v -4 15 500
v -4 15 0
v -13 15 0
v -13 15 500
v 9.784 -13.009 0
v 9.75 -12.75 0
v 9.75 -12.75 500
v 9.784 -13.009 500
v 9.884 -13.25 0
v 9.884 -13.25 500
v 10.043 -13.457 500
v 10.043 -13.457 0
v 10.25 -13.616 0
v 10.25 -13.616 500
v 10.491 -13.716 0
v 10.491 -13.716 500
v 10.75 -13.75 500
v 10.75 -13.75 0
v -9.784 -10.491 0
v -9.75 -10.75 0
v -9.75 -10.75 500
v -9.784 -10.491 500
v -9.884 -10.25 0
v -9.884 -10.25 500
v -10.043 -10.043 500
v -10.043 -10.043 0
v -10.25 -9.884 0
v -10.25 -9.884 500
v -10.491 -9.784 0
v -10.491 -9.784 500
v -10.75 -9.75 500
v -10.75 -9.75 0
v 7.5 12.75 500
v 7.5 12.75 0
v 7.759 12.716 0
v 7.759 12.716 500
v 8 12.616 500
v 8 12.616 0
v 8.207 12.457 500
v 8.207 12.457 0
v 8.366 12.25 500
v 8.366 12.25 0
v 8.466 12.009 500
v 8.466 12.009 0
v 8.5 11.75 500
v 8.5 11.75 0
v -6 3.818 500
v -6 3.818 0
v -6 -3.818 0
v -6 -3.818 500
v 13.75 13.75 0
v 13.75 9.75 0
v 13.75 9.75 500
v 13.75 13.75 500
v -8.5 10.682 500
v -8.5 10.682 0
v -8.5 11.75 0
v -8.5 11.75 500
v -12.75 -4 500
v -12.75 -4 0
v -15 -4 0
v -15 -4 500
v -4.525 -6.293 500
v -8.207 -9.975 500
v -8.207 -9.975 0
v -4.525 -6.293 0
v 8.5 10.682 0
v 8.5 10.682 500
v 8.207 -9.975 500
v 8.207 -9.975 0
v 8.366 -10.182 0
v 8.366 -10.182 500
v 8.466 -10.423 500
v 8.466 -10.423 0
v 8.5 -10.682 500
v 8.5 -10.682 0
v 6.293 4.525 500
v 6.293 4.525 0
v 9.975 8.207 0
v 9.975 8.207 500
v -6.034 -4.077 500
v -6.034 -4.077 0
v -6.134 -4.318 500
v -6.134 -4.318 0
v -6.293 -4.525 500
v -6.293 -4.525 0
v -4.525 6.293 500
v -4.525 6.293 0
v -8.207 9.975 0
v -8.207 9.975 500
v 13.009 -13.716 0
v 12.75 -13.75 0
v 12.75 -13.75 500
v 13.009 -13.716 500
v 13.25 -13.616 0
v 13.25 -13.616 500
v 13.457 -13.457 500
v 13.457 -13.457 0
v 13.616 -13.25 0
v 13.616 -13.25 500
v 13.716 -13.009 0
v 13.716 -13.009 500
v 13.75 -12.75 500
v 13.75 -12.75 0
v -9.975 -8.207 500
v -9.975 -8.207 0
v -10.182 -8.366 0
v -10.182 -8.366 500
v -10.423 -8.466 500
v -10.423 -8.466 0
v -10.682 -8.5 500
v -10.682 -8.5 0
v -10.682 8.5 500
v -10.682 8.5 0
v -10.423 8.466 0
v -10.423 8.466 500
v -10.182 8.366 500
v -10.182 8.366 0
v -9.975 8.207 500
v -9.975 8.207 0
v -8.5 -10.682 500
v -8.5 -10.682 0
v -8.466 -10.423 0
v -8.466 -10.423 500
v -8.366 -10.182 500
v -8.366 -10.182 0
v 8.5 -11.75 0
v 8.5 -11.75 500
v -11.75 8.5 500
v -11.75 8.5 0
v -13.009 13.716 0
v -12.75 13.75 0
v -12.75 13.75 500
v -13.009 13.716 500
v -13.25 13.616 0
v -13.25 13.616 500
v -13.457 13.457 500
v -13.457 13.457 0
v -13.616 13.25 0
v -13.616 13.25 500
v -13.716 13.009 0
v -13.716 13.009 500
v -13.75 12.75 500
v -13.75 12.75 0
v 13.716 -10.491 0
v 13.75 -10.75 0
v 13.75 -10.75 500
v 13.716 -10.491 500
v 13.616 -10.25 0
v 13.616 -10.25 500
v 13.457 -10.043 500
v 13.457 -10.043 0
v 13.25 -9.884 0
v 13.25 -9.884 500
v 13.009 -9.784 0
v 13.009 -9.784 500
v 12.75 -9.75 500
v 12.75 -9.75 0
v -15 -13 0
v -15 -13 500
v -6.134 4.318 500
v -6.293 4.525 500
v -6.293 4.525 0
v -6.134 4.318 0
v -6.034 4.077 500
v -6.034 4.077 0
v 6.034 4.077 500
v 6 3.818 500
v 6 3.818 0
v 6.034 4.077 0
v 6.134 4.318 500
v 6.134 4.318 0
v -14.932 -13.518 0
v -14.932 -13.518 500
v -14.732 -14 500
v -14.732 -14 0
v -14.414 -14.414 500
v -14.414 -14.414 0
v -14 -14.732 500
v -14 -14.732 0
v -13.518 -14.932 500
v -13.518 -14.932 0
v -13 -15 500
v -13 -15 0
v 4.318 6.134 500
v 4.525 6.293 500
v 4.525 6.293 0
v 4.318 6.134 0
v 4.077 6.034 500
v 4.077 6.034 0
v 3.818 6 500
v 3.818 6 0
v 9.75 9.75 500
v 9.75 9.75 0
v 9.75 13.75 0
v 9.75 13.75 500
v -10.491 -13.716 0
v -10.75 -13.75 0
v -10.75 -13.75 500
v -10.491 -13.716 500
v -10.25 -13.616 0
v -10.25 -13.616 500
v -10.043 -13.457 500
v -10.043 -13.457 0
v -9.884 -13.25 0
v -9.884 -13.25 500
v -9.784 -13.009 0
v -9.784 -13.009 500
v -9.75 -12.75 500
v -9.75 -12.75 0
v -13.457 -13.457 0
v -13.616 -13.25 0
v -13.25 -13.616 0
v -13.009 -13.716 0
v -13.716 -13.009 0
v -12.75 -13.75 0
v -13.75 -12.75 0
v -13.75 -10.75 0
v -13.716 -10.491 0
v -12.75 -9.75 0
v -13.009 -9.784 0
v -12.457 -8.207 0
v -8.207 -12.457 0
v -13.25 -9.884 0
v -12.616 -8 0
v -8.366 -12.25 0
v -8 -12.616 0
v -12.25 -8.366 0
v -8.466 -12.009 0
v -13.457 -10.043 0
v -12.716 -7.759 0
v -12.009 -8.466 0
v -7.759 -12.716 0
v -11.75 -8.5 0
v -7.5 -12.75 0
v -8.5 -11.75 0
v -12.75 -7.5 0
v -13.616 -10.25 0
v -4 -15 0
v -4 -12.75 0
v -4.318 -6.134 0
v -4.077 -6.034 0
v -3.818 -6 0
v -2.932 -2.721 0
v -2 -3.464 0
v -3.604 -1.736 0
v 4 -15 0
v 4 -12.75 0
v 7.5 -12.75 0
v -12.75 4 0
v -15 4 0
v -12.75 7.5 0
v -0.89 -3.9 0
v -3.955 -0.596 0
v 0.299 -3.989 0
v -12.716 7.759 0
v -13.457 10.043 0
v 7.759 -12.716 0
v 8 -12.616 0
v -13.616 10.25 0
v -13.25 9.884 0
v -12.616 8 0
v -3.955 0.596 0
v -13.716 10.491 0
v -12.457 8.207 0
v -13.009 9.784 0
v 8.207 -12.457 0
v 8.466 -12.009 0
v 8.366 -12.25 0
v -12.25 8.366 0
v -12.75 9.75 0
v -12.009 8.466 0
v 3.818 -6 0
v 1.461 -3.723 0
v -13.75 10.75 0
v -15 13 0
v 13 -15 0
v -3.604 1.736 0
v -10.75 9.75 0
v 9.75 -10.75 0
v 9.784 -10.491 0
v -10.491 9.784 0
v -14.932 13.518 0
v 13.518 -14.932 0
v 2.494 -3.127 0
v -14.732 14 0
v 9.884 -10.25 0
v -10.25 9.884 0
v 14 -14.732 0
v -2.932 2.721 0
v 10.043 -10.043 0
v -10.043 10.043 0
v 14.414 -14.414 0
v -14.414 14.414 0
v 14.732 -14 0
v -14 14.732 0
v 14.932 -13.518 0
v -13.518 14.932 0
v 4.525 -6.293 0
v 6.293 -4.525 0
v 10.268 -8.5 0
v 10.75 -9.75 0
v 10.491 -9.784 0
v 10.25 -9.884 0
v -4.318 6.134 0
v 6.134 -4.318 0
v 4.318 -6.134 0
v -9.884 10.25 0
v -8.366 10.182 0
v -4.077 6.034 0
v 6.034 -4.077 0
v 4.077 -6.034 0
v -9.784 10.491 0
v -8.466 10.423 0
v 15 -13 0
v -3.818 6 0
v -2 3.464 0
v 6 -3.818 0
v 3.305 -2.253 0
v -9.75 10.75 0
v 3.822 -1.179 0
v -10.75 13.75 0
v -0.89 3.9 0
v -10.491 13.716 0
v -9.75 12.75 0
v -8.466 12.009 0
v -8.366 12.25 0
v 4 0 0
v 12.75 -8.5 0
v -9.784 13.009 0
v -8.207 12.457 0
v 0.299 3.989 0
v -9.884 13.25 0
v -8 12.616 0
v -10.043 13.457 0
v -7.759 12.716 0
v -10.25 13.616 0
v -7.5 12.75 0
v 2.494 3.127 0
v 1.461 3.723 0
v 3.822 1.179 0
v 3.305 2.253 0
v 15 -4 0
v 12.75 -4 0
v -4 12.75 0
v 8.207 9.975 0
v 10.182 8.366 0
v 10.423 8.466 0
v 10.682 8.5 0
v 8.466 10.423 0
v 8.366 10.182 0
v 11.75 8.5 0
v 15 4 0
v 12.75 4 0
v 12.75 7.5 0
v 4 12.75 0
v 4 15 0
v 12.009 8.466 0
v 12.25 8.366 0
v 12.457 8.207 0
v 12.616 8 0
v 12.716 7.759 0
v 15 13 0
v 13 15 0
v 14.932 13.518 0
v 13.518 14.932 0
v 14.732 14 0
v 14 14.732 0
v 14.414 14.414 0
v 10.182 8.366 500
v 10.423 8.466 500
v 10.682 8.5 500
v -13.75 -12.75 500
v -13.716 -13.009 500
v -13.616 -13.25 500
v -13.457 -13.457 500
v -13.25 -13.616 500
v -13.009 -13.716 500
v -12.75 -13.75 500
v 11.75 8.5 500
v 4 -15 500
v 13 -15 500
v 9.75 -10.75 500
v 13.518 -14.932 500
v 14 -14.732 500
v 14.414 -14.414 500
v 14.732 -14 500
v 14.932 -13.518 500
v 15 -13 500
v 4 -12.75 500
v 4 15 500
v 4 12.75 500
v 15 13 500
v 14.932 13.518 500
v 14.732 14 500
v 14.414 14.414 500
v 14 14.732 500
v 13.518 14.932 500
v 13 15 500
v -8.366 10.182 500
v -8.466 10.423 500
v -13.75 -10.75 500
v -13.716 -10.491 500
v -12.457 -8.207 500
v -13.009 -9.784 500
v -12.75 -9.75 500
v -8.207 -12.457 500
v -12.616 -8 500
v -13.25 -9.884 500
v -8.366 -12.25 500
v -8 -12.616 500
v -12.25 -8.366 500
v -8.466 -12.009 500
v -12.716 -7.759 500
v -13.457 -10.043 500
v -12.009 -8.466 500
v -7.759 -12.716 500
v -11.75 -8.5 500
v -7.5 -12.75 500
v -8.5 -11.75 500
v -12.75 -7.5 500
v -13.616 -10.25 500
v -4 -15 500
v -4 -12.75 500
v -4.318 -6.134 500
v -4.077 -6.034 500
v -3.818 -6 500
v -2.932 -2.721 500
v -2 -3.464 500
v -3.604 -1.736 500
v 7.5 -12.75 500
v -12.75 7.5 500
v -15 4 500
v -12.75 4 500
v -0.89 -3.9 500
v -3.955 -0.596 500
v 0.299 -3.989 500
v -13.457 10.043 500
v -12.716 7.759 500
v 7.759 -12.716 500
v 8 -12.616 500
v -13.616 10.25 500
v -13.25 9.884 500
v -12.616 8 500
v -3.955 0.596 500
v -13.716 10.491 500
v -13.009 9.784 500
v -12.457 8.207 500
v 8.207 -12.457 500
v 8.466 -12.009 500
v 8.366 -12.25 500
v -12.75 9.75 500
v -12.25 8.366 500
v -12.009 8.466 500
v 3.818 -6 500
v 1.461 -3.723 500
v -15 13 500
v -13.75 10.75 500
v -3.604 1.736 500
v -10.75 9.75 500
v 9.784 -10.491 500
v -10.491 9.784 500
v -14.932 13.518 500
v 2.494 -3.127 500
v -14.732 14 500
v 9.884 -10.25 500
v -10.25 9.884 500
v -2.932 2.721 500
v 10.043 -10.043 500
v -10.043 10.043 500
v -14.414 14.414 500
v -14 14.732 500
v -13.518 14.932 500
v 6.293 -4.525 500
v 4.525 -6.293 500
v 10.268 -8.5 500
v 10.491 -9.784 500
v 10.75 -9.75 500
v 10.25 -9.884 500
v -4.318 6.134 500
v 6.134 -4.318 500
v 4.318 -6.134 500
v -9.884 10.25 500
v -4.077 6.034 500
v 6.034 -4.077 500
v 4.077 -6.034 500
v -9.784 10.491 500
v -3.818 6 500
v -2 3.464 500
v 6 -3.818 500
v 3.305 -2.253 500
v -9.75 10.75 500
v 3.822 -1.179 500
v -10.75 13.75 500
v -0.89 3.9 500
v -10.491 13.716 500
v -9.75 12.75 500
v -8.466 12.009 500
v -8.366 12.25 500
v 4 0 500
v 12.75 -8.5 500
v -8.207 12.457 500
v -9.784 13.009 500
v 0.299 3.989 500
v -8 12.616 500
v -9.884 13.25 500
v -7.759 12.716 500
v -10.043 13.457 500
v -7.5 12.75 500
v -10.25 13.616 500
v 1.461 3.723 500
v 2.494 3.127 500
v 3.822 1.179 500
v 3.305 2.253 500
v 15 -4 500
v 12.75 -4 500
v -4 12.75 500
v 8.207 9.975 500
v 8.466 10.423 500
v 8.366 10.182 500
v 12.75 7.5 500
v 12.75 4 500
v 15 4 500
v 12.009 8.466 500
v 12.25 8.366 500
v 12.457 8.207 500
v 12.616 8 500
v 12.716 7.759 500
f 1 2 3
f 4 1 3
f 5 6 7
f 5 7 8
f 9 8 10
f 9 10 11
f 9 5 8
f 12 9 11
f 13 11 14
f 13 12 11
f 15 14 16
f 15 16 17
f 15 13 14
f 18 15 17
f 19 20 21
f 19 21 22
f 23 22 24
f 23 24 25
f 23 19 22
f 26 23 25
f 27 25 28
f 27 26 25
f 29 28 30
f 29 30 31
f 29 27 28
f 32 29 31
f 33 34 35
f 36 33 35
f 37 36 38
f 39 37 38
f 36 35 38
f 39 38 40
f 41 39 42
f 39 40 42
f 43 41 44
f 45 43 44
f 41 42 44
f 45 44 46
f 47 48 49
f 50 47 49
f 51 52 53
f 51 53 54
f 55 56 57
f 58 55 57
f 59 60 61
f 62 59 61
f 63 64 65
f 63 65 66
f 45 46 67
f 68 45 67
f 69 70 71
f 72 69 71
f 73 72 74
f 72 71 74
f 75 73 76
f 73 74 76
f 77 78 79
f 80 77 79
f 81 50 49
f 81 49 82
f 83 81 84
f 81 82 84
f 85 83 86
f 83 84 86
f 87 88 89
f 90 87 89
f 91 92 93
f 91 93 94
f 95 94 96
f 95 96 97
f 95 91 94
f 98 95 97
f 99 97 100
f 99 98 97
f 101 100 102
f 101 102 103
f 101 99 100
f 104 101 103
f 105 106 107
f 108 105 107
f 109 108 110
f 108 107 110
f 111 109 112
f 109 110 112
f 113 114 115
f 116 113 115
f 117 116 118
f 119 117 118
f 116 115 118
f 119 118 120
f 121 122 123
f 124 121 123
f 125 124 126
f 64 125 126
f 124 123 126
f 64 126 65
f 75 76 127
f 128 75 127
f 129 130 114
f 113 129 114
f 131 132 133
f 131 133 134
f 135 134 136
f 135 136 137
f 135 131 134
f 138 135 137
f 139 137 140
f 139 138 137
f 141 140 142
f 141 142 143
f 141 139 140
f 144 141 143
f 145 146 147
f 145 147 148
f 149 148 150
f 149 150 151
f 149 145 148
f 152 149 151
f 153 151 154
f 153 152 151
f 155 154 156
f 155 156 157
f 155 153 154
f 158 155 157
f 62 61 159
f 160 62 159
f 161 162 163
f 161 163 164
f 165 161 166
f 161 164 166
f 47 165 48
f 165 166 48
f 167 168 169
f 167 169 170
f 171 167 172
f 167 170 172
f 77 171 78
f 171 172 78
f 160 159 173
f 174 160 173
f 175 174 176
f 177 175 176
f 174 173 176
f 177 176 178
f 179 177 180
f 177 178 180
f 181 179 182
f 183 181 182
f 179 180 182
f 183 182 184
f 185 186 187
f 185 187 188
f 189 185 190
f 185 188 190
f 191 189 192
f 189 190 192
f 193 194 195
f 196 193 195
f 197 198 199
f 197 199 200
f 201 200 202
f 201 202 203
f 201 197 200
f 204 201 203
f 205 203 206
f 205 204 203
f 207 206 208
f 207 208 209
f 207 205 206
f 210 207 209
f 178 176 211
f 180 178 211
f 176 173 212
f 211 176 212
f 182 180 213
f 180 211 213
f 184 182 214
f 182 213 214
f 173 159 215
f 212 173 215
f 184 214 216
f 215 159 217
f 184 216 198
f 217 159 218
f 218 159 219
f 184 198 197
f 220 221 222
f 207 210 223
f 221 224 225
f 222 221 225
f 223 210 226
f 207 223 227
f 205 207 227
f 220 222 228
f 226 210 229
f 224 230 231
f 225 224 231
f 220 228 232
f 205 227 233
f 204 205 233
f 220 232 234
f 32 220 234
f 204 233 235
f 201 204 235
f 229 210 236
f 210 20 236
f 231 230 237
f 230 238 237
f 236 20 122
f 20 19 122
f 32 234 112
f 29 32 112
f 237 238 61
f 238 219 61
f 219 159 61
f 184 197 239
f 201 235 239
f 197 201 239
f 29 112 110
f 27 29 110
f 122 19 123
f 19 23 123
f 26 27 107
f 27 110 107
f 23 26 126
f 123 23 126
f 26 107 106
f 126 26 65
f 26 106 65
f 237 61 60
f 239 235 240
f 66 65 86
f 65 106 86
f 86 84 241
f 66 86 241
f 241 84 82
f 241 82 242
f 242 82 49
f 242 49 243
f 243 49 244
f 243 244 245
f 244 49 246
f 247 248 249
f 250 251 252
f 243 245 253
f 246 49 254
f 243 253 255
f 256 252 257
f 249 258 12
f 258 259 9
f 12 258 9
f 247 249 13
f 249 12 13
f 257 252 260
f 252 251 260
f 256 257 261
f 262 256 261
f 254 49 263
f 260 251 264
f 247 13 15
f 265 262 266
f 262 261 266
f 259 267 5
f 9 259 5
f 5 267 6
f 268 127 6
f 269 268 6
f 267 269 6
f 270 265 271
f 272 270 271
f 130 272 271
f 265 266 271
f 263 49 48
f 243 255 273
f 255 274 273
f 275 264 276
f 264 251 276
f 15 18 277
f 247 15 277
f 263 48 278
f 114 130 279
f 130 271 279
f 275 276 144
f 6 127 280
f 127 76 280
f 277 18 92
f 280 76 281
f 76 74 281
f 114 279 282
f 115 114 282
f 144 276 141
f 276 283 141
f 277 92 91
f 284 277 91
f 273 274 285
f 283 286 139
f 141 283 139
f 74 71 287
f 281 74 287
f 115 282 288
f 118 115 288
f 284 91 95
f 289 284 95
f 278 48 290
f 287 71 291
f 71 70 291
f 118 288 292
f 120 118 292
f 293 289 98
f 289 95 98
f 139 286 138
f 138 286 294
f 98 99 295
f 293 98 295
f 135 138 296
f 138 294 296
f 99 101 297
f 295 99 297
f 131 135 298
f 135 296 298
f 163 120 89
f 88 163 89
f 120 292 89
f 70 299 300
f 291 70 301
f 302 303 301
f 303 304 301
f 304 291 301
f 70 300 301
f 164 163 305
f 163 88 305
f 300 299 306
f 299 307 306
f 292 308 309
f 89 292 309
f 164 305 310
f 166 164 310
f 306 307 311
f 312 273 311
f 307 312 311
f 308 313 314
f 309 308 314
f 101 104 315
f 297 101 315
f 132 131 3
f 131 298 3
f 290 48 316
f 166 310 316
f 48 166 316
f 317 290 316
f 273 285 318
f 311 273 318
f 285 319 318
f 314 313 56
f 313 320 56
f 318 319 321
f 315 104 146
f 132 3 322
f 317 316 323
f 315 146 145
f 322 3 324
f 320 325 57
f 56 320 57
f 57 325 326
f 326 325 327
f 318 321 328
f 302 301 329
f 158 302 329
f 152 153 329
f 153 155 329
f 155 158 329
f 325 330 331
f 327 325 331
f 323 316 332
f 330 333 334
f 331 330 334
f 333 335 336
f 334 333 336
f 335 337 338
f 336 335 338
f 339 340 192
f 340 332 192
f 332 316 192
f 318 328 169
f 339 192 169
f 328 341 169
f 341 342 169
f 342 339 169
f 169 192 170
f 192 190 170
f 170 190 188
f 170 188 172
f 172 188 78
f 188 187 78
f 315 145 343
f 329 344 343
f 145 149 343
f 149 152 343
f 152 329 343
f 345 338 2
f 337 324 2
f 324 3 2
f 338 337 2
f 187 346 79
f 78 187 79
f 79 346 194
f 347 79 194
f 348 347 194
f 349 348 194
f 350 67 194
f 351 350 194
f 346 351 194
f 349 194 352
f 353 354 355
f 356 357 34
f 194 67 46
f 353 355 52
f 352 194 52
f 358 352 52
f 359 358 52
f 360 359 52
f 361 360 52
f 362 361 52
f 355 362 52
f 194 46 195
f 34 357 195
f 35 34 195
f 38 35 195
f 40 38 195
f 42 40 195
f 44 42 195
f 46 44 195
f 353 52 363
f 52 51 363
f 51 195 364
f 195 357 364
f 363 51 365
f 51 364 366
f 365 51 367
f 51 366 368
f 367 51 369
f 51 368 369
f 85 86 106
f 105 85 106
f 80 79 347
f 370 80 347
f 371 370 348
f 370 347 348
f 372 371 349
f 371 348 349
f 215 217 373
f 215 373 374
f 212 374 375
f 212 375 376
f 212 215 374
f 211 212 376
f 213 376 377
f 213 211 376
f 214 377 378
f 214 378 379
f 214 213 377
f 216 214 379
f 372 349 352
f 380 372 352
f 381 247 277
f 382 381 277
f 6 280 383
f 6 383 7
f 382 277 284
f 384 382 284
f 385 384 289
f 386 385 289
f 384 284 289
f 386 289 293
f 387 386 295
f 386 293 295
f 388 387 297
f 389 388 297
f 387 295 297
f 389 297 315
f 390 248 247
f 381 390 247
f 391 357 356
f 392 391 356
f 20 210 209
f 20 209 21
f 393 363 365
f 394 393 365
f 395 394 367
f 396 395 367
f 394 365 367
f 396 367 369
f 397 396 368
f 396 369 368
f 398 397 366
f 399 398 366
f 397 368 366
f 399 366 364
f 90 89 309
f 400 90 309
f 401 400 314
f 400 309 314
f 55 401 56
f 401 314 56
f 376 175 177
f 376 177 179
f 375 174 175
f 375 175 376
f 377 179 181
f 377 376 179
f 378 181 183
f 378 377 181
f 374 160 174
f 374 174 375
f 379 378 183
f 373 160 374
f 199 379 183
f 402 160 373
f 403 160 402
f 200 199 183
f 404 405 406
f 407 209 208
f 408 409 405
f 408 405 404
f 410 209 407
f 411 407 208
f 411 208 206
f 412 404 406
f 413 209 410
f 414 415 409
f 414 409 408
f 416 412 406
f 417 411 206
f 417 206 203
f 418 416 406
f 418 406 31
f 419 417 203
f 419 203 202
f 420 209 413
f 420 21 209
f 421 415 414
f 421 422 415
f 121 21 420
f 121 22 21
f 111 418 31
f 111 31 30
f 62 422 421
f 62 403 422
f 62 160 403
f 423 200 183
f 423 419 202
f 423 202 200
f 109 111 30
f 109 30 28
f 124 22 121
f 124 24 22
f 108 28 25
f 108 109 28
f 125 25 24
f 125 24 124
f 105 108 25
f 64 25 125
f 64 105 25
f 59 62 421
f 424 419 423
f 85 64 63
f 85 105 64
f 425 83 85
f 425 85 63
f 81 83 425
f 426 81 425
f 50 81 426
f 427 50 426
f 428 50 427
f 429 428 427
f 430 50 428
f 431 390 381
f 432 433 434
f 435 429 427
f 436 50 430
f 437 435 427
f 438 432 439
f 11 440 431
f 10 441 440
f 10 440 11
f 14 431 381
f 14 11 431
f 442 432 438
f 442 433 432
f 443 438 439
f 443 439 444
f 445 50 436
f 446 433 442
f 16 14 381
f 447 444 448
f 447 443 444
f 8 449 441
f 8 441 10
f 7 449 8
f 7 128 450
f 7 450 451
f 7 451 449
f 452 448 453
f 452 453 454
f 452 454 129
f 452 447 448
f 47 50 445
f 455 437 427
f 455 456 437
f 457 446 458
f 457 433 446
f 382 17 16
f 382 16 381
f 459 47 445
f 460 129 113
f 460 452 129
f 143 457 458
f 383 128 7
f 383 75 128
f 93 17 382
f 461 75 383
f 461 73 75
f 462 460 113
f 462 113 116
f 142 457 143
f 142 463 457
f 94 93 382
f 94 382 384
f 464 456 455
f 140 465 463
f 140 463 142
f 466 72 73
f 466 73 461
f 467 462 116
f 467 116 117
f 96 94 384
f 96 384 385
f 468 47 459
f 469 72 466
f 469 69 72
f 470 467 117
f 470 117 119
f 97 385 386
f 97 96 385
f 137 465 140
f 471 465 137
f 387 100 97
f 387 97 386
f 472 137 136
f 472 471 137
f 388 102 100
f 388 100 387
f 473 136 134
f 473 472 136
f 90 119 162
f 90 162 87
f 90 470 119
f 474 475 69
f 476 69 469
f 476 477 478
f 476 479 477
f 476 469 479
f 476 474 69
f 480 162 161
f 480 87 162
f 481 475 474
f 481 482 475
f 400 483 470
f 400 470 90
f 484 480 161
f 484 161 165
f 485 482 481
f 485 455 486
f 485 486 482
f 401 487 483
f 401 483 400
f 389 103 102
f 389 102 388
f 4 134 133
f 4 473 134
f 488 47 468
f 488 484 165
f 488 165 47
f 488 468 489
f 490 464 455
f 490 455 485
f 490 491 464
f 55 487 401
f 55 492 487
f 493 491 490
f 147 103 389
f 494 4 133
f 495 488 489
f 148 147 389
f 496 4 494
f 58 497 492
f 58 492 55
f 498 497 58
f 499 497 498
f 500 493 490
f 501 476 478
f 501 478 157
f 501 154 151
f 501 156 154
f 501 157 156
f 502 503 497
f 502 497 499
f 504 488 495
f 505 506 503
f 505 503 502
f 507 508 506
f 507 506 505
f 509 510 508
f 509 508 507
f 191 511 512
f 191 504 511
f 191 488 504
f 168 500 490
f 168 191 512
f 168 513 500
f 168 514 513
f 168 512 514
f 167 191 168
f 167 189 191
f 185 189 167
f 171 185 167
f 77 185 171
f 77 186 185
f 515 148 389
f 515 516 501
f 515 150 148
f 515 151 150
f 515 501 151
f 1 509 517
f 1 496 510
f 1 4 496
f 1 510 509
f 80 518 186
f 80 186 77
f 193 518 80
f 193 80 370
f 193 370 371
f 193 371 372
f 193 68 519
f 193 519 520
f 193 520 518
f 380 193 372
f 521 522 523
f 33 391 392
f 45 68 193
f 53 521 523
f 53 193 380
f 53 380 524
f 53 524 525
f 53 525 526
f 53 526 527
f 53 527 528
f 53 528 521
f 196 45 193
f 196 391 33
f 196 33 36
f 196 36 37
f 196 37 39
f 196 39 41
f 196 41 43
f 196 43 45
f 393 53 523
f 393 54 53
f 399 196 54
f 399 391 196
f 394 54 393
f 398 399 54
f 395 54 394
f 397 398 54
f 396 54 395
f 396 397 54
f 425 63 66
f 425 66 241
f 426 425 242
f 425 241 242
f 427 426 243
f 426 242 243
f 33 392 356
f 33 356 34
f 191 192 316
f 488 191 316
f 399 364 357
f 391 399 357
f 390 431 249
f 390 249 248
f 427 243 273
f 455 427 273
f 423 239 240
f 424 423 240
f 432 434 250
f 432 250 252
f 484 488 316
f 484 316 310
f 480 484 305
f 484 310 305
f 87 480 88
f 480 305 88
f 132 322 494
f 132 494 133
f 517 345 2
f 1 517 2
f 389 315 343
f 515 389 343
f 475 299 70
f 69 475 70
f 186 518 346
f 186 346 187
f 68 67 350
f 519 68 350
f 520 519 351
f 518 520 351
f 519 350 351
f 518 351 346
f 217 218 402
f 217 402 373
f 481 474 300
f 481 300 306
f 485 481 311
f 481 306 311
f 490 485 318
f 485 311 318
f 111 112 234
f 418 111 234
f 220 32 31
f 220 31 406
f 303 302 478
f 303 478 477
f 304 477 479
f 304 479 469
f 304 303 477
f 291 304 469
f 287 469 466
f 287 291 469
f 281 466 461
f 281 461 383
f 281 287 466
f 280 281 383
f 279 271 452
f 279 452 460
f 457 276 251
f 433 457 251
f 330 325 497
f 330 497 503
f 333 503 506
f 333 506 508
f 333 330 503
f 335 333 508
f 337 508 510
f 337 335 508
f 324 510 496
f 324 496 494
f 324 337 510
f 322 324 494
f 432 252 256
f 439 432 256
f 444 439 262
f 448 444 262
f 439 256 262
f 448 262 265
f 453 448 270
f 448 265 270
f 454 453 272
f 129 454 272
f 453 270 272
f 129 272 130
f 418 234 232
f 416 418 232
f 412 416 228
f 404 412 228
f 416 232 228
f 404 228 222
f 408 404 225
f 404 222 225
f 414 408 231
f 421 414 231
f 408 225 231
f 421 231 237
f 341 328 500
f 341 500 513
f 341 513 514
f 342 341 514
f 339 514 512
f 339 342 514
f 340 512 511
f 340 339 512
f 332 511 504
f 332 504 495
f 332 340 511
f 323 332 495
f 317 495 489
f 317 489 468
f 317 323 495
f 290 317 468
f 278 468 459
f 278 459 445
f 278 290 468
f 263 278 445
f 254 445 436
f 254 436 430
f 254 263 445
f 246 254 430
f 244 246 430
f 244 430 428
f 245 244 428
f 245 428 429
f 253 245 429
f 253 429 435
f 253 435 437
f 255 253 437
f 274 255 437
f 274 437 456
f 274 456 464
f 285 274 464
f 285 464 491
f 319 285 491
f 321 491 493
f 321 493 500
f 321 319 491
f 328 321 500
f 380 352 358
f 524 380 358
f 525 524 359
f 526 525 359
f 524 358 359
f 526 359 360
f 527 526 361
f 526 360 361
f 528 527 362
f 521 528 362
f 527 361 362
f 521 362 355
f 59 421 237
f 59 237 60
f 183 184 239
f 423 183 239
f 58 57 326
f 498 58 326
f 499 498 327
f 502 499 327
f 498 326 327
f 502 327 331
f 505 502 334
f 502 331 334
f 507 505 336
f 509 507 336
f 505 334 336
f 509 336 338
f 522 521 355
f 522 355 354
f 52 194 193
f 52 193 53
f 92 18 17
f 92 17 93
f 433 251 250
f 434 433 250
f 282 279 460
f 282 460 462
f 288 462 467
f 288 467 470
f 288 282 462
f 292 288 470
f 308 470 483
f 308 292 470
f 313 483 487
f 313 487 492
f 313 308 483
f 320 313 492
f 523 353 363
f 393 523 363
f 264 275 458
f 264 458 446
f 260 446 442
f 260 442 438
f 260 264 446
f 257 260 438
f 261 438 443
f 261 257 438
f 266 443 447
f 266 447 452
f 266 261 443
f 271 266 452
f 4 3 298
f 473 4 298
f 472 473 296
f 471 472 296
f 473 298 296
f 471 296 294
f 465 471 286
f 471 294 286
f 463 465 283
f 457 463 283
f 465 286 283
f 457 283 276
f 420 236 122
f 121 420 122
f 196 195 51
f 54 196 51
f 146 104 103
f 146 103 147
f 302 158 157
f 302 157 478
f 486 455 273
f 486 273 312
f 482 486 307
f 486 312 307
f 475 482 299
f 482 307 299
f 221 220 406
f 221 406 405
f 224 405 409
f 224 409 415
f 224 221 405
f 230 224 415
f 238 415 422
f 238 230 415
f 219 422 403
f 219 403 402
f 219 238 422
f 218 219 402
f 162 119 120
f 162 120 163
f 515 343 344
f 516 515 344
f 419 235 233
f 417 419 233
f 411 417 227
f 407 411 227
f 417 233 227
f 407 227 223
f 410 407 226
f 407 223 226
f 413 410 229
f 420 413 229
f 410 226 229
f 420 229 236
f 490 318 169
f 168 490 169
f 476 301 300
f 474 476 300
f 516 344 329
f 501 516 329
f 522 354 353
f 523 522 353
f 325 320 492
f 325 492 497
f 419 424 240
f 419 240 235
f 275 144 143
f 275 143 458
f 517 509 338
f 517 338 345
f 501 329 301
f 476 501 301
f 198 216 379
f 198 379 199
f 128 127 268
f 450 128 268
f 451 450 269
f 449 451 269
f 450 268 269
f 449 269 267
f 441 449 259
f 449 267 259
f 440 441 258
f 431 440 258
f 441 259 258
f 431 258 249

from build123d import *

# Parameters (mm, degrees)
SKETCH1_R           = 4
SKETCH1_W           = 4
SKETCH1_H           = 4
BOSS_EXTRUDE1_DEPTH = 500


with BuildPart() as part:
    # Sketch1 → Boss-Extrude1 (new body)
    with BuildSketch(Plane.XY):
        with BuildLine():
            Line((-15, -4), (-15, -13))
            ThreePointArc((-15, -13), (-14.414213562, -14.414213562), (-13, -15))
            Line((-13, -15), (-4, -15))
            Line((-4, -15), (-4, -12.75))
            Line((-4, -12.75), (-7.5, -12.75))
            ThreePointArc((-7.5, -12.75), (-8.207106781, -12.457106781), (-8.5, -11.75))
            Line((-8.5, -11.75), (-8.5, -10.681980515))
            ThreePointArc((-8.5, -10.681980515), (-8.423879533, -10.299297083), (-8.207106781, -9.974873734))
            Line((-8.207106781, -9.974873734), (-4.525126266, -6.292893219))
            ThreePointArc((-4.525126266, -6.292893219), (-4.200702917, -6.076120467), (-3.818019485, -6))
            Line((-3.818019485, -6), (3.818019485, -6))
            ThreePointArc((3.818019485, -6), (4.200702917, -6.076120467), (4.525126266, -6.292893219))
            Line((4.525126266, -6.292893219), (8.207106781, -9.974873734))
            ThreePointArc((8.207106781, -9.974873734), (8.423879533, -10.299297083), (8.5, -10.681980515))
            Line((8.5, -10.681980515), (8.5, -11.75))
            ThreePointArc((8.5, -11.75), (8.207106781, -12.457106781), (7.5, -12.75))
            Line((7.5, -12.75), (4, -12.75))
            Line((4, -12.75), (4, -15))
            Line((4, -15), (13, -15))
            ThreePointArc((13, -15), (14.414213562, -14.414213562), (15, -13))
            Line((15, -13), (15, -4))
            Line((15, -4), (12.75, -4))
            Line((12.75, -4), (12.75, -8.5))
            Line((12.75, -8.5), (10.267766953, -8.5))
            Line((10.267766953, -8.5), (6.292893219, -4.525126266))
            ThreePointArc((6.292893219, -4.525126266), (6.076120467, -4.200702917), (6, -3.818019485))
            Line((6, -3.818019485), (6, 3.818019485))
            ThreePointArc((6, 3.818019485), (6.076120467, 4.200702917), (6.292893219, 4.525126266))
            Line((6.292893219, 4.525126266), (9.974873734, 8.207106781))
            ThreePointArc((9.974873734, 8.207106781), (10.299297083, 8.423879533), (10.681980515, 8.5))
            Line((10.681980515, 8.5), (11.75, 8.5))
            ThreePointArc((11.75, 8.5), (12.457106781, 8.207106781), (12.75, 7.5))
            Line((12.75, 7.5), (12.75, 4))
            Line((12.75, 4), (15, 4))
            Line((15, 4), (15, 13))
            ThreePointArc((15, 13), (14.414213562, 14.414213562), (13, 15))
            Line((13, 15), (4, 15))
            Line((4, 15), (4, 12.75))
            Line((4, 12.75), (7.5, 12.75))
            ThreePointArc((7.5, 12.75), (8.207106781, 12.457106781), (8.5, 11.75))
            Line((8.5, 11.75), (8.5, 10.681980515))
            ThreePointArc((8.5, 10.681980515), (8.423879533, 10.299297083), (8.207106781, 9.974873734))
            Line((8.207106781, 9.974873734), (4.525126266, 6.292893219))
            ThreePointArc((4.525126266, 6.292893219), (4.200702917, 6.076120467), (3.818019485, 6))
            Line((3.818019485, 6), (-3.818019485, 6))
            ThreePointArc((-3.818019485, 6), (-4.200702917, 6.076120467), (-4.525126266, 6.292893219))
            Line((-4.525126266, 6.292893219), (-8.207106781, 9.974873734))
            ThreePointArc((-8.207106781, 9.974873734), (-8.423879533, 10.299297083), (-8.5, 10.681980515))
            Line((-8.5, 10.681980515), (-8.5, 11.75))
            ThreePointArc((-8.5, 11.75), (-8.207106781, 12.457106781), (-7.5, 12.75))
            Line((-7.5, 12.75), (-4, 12.75))
            Line((-4, 12.75), (-4, 15))
            Line((-4, 15), (-13, 15))
            ThreePointArc((-13, 15), (-14.414213562, 14.414213562), (-15, 13))
            Line((-15, 13), (-15, 4))
            Line((-15, 4), (-12.75, 4))
            Line((-12.75, 4), (-12.75, 7.5))
            ThreePointArc((-12.75, 7.5), (-12.457106781, 8.207106781), (-11.75, 8.5))
            Line((-11.75, 8.5), (-10.681980515, 8.5))
            ThreePointArc((-10.681980515, 8.5), (-10.299297083, 8.423879533), (-9.974873734, 8.207106781))
            Line((-9.974873734, 8.207106781), (-6.292893219, 4.525126266))
            ThreePointArc((-6.292893219, 4.525126266), (-6.076120467, 4.200702917), (-6, 3.818019485))
            Line((-6, 3.818019485), (-6, -3.818019485))
            ThreePointArc((-6, -3.818019485), (-6.076120467, -4.200702917), (-6.292893219, -4.525126266))
            Line((-6.292893219, -4.525126266), (-9.974873734, -8.207106781))
            ThreePointArc((-9.974873734, -8.207106781), (-10.299297083, -8.423879533), (-10.681980515, -8.5))
            Line((-10.681980515, -8.5), (-11.75, -8.5))
            ThreePointArc((-11.75, -8.5), (-12.457106781, -8.207106781), (-12.75, -7.5))
            Line((-12.75, -7.5), (-12.75, -4))
            Line((-12.75, -4), (-15, -4))
        make_face()
        Circle(SKETCH1_R, mode=Mode.SUBTRACT)
        with BuildLine():
            Line((9.75, -10.75), (9.75, -12.75))
            ThreePointArc((9.75, -12.75), (10.042893219, -13.457106781), (10.75, -13.75))
            Line((10.75, -13.75), (12.75, -13.75))
            ThreePointArc((12.75, -13.75), (13.457106781, -13.457106781), (13.75, -12.75))
            Line((13.75, -12.75), (13.75, -10.75))
            ThreePointArc((13.75, -10.75), (13.457106781, -10.042893219), (12.75, -9.75))
            Line((12.75, -9.75), (10.75, -9.75))
            ThreePointArc((10.75, -9.75), (10.042893219, -10.042893219), (9.75, -10.75))
        make_face(mode=Mode.SUBTRACT)
        with Locations((11.75, 11.75)):
            Rectangle(SKETCH1_W, SKETCH1_H, mode=Mode.SUBTRACT)
        with BuildLine():
            Line((-10.75, 13.75), (-12.75, 13.75))
            ThreePointArc((-12.75, 13.75), (-13.457106781, 13.457106781), (-13.75, 12.75))
            Line((-13.75, 12.75), (-13.75, 10.75))
            ThreePointArc((-13.75, 10.75), (-13.457106781, 10.042893219), (-12.75, 9.75))
            Line((-12.75, 9.75), (-10.75, 9.75))
            ThreePointArc((-10.75, 9.75), (-10.042893219, 10.042893219), (-9.75, 10.75))
            Line((-9.75, 10.75), (-9.75, 12.75))
            ThreePointArc((-9.75, 12.75), (-10.042893219, 13.457106781), (-10.75, 13.75))
        make_face(mode=Mode.SUBTRACT)
        with BuildLine():
            Line((-12.75, -13.75), (-10.75, -13.75))
            ThreePointArc((-10.75, -13.75), (-10.042893219, -13.457106781), (-9.75, -12.75))
            Line((-9.75, -12.75), (-9.75, -10.75))
            ThreePointArc((-9.75, -10.75), (-10.042893219, -10.042893219), (-10.75, -9.75))
            Line((-10.75, -9.75), (-12.75, -9.75))
            ThreePointArc((-12.75, -9.75), (-13.457106781, -10.042893219), (-13.75, -10.75))
            Line((-13.75, -10.75), (-13.75, -12.75))
            ThreePointArc((-13.75, -12.75), (-13.457106781, -13.457106781), (-12.75, -13.75))
        make_face(mode=Mode.SUBTRACT)
    extrude(amount=BOSS_EXTRUDE1_DEPTH)


solid = part.part
